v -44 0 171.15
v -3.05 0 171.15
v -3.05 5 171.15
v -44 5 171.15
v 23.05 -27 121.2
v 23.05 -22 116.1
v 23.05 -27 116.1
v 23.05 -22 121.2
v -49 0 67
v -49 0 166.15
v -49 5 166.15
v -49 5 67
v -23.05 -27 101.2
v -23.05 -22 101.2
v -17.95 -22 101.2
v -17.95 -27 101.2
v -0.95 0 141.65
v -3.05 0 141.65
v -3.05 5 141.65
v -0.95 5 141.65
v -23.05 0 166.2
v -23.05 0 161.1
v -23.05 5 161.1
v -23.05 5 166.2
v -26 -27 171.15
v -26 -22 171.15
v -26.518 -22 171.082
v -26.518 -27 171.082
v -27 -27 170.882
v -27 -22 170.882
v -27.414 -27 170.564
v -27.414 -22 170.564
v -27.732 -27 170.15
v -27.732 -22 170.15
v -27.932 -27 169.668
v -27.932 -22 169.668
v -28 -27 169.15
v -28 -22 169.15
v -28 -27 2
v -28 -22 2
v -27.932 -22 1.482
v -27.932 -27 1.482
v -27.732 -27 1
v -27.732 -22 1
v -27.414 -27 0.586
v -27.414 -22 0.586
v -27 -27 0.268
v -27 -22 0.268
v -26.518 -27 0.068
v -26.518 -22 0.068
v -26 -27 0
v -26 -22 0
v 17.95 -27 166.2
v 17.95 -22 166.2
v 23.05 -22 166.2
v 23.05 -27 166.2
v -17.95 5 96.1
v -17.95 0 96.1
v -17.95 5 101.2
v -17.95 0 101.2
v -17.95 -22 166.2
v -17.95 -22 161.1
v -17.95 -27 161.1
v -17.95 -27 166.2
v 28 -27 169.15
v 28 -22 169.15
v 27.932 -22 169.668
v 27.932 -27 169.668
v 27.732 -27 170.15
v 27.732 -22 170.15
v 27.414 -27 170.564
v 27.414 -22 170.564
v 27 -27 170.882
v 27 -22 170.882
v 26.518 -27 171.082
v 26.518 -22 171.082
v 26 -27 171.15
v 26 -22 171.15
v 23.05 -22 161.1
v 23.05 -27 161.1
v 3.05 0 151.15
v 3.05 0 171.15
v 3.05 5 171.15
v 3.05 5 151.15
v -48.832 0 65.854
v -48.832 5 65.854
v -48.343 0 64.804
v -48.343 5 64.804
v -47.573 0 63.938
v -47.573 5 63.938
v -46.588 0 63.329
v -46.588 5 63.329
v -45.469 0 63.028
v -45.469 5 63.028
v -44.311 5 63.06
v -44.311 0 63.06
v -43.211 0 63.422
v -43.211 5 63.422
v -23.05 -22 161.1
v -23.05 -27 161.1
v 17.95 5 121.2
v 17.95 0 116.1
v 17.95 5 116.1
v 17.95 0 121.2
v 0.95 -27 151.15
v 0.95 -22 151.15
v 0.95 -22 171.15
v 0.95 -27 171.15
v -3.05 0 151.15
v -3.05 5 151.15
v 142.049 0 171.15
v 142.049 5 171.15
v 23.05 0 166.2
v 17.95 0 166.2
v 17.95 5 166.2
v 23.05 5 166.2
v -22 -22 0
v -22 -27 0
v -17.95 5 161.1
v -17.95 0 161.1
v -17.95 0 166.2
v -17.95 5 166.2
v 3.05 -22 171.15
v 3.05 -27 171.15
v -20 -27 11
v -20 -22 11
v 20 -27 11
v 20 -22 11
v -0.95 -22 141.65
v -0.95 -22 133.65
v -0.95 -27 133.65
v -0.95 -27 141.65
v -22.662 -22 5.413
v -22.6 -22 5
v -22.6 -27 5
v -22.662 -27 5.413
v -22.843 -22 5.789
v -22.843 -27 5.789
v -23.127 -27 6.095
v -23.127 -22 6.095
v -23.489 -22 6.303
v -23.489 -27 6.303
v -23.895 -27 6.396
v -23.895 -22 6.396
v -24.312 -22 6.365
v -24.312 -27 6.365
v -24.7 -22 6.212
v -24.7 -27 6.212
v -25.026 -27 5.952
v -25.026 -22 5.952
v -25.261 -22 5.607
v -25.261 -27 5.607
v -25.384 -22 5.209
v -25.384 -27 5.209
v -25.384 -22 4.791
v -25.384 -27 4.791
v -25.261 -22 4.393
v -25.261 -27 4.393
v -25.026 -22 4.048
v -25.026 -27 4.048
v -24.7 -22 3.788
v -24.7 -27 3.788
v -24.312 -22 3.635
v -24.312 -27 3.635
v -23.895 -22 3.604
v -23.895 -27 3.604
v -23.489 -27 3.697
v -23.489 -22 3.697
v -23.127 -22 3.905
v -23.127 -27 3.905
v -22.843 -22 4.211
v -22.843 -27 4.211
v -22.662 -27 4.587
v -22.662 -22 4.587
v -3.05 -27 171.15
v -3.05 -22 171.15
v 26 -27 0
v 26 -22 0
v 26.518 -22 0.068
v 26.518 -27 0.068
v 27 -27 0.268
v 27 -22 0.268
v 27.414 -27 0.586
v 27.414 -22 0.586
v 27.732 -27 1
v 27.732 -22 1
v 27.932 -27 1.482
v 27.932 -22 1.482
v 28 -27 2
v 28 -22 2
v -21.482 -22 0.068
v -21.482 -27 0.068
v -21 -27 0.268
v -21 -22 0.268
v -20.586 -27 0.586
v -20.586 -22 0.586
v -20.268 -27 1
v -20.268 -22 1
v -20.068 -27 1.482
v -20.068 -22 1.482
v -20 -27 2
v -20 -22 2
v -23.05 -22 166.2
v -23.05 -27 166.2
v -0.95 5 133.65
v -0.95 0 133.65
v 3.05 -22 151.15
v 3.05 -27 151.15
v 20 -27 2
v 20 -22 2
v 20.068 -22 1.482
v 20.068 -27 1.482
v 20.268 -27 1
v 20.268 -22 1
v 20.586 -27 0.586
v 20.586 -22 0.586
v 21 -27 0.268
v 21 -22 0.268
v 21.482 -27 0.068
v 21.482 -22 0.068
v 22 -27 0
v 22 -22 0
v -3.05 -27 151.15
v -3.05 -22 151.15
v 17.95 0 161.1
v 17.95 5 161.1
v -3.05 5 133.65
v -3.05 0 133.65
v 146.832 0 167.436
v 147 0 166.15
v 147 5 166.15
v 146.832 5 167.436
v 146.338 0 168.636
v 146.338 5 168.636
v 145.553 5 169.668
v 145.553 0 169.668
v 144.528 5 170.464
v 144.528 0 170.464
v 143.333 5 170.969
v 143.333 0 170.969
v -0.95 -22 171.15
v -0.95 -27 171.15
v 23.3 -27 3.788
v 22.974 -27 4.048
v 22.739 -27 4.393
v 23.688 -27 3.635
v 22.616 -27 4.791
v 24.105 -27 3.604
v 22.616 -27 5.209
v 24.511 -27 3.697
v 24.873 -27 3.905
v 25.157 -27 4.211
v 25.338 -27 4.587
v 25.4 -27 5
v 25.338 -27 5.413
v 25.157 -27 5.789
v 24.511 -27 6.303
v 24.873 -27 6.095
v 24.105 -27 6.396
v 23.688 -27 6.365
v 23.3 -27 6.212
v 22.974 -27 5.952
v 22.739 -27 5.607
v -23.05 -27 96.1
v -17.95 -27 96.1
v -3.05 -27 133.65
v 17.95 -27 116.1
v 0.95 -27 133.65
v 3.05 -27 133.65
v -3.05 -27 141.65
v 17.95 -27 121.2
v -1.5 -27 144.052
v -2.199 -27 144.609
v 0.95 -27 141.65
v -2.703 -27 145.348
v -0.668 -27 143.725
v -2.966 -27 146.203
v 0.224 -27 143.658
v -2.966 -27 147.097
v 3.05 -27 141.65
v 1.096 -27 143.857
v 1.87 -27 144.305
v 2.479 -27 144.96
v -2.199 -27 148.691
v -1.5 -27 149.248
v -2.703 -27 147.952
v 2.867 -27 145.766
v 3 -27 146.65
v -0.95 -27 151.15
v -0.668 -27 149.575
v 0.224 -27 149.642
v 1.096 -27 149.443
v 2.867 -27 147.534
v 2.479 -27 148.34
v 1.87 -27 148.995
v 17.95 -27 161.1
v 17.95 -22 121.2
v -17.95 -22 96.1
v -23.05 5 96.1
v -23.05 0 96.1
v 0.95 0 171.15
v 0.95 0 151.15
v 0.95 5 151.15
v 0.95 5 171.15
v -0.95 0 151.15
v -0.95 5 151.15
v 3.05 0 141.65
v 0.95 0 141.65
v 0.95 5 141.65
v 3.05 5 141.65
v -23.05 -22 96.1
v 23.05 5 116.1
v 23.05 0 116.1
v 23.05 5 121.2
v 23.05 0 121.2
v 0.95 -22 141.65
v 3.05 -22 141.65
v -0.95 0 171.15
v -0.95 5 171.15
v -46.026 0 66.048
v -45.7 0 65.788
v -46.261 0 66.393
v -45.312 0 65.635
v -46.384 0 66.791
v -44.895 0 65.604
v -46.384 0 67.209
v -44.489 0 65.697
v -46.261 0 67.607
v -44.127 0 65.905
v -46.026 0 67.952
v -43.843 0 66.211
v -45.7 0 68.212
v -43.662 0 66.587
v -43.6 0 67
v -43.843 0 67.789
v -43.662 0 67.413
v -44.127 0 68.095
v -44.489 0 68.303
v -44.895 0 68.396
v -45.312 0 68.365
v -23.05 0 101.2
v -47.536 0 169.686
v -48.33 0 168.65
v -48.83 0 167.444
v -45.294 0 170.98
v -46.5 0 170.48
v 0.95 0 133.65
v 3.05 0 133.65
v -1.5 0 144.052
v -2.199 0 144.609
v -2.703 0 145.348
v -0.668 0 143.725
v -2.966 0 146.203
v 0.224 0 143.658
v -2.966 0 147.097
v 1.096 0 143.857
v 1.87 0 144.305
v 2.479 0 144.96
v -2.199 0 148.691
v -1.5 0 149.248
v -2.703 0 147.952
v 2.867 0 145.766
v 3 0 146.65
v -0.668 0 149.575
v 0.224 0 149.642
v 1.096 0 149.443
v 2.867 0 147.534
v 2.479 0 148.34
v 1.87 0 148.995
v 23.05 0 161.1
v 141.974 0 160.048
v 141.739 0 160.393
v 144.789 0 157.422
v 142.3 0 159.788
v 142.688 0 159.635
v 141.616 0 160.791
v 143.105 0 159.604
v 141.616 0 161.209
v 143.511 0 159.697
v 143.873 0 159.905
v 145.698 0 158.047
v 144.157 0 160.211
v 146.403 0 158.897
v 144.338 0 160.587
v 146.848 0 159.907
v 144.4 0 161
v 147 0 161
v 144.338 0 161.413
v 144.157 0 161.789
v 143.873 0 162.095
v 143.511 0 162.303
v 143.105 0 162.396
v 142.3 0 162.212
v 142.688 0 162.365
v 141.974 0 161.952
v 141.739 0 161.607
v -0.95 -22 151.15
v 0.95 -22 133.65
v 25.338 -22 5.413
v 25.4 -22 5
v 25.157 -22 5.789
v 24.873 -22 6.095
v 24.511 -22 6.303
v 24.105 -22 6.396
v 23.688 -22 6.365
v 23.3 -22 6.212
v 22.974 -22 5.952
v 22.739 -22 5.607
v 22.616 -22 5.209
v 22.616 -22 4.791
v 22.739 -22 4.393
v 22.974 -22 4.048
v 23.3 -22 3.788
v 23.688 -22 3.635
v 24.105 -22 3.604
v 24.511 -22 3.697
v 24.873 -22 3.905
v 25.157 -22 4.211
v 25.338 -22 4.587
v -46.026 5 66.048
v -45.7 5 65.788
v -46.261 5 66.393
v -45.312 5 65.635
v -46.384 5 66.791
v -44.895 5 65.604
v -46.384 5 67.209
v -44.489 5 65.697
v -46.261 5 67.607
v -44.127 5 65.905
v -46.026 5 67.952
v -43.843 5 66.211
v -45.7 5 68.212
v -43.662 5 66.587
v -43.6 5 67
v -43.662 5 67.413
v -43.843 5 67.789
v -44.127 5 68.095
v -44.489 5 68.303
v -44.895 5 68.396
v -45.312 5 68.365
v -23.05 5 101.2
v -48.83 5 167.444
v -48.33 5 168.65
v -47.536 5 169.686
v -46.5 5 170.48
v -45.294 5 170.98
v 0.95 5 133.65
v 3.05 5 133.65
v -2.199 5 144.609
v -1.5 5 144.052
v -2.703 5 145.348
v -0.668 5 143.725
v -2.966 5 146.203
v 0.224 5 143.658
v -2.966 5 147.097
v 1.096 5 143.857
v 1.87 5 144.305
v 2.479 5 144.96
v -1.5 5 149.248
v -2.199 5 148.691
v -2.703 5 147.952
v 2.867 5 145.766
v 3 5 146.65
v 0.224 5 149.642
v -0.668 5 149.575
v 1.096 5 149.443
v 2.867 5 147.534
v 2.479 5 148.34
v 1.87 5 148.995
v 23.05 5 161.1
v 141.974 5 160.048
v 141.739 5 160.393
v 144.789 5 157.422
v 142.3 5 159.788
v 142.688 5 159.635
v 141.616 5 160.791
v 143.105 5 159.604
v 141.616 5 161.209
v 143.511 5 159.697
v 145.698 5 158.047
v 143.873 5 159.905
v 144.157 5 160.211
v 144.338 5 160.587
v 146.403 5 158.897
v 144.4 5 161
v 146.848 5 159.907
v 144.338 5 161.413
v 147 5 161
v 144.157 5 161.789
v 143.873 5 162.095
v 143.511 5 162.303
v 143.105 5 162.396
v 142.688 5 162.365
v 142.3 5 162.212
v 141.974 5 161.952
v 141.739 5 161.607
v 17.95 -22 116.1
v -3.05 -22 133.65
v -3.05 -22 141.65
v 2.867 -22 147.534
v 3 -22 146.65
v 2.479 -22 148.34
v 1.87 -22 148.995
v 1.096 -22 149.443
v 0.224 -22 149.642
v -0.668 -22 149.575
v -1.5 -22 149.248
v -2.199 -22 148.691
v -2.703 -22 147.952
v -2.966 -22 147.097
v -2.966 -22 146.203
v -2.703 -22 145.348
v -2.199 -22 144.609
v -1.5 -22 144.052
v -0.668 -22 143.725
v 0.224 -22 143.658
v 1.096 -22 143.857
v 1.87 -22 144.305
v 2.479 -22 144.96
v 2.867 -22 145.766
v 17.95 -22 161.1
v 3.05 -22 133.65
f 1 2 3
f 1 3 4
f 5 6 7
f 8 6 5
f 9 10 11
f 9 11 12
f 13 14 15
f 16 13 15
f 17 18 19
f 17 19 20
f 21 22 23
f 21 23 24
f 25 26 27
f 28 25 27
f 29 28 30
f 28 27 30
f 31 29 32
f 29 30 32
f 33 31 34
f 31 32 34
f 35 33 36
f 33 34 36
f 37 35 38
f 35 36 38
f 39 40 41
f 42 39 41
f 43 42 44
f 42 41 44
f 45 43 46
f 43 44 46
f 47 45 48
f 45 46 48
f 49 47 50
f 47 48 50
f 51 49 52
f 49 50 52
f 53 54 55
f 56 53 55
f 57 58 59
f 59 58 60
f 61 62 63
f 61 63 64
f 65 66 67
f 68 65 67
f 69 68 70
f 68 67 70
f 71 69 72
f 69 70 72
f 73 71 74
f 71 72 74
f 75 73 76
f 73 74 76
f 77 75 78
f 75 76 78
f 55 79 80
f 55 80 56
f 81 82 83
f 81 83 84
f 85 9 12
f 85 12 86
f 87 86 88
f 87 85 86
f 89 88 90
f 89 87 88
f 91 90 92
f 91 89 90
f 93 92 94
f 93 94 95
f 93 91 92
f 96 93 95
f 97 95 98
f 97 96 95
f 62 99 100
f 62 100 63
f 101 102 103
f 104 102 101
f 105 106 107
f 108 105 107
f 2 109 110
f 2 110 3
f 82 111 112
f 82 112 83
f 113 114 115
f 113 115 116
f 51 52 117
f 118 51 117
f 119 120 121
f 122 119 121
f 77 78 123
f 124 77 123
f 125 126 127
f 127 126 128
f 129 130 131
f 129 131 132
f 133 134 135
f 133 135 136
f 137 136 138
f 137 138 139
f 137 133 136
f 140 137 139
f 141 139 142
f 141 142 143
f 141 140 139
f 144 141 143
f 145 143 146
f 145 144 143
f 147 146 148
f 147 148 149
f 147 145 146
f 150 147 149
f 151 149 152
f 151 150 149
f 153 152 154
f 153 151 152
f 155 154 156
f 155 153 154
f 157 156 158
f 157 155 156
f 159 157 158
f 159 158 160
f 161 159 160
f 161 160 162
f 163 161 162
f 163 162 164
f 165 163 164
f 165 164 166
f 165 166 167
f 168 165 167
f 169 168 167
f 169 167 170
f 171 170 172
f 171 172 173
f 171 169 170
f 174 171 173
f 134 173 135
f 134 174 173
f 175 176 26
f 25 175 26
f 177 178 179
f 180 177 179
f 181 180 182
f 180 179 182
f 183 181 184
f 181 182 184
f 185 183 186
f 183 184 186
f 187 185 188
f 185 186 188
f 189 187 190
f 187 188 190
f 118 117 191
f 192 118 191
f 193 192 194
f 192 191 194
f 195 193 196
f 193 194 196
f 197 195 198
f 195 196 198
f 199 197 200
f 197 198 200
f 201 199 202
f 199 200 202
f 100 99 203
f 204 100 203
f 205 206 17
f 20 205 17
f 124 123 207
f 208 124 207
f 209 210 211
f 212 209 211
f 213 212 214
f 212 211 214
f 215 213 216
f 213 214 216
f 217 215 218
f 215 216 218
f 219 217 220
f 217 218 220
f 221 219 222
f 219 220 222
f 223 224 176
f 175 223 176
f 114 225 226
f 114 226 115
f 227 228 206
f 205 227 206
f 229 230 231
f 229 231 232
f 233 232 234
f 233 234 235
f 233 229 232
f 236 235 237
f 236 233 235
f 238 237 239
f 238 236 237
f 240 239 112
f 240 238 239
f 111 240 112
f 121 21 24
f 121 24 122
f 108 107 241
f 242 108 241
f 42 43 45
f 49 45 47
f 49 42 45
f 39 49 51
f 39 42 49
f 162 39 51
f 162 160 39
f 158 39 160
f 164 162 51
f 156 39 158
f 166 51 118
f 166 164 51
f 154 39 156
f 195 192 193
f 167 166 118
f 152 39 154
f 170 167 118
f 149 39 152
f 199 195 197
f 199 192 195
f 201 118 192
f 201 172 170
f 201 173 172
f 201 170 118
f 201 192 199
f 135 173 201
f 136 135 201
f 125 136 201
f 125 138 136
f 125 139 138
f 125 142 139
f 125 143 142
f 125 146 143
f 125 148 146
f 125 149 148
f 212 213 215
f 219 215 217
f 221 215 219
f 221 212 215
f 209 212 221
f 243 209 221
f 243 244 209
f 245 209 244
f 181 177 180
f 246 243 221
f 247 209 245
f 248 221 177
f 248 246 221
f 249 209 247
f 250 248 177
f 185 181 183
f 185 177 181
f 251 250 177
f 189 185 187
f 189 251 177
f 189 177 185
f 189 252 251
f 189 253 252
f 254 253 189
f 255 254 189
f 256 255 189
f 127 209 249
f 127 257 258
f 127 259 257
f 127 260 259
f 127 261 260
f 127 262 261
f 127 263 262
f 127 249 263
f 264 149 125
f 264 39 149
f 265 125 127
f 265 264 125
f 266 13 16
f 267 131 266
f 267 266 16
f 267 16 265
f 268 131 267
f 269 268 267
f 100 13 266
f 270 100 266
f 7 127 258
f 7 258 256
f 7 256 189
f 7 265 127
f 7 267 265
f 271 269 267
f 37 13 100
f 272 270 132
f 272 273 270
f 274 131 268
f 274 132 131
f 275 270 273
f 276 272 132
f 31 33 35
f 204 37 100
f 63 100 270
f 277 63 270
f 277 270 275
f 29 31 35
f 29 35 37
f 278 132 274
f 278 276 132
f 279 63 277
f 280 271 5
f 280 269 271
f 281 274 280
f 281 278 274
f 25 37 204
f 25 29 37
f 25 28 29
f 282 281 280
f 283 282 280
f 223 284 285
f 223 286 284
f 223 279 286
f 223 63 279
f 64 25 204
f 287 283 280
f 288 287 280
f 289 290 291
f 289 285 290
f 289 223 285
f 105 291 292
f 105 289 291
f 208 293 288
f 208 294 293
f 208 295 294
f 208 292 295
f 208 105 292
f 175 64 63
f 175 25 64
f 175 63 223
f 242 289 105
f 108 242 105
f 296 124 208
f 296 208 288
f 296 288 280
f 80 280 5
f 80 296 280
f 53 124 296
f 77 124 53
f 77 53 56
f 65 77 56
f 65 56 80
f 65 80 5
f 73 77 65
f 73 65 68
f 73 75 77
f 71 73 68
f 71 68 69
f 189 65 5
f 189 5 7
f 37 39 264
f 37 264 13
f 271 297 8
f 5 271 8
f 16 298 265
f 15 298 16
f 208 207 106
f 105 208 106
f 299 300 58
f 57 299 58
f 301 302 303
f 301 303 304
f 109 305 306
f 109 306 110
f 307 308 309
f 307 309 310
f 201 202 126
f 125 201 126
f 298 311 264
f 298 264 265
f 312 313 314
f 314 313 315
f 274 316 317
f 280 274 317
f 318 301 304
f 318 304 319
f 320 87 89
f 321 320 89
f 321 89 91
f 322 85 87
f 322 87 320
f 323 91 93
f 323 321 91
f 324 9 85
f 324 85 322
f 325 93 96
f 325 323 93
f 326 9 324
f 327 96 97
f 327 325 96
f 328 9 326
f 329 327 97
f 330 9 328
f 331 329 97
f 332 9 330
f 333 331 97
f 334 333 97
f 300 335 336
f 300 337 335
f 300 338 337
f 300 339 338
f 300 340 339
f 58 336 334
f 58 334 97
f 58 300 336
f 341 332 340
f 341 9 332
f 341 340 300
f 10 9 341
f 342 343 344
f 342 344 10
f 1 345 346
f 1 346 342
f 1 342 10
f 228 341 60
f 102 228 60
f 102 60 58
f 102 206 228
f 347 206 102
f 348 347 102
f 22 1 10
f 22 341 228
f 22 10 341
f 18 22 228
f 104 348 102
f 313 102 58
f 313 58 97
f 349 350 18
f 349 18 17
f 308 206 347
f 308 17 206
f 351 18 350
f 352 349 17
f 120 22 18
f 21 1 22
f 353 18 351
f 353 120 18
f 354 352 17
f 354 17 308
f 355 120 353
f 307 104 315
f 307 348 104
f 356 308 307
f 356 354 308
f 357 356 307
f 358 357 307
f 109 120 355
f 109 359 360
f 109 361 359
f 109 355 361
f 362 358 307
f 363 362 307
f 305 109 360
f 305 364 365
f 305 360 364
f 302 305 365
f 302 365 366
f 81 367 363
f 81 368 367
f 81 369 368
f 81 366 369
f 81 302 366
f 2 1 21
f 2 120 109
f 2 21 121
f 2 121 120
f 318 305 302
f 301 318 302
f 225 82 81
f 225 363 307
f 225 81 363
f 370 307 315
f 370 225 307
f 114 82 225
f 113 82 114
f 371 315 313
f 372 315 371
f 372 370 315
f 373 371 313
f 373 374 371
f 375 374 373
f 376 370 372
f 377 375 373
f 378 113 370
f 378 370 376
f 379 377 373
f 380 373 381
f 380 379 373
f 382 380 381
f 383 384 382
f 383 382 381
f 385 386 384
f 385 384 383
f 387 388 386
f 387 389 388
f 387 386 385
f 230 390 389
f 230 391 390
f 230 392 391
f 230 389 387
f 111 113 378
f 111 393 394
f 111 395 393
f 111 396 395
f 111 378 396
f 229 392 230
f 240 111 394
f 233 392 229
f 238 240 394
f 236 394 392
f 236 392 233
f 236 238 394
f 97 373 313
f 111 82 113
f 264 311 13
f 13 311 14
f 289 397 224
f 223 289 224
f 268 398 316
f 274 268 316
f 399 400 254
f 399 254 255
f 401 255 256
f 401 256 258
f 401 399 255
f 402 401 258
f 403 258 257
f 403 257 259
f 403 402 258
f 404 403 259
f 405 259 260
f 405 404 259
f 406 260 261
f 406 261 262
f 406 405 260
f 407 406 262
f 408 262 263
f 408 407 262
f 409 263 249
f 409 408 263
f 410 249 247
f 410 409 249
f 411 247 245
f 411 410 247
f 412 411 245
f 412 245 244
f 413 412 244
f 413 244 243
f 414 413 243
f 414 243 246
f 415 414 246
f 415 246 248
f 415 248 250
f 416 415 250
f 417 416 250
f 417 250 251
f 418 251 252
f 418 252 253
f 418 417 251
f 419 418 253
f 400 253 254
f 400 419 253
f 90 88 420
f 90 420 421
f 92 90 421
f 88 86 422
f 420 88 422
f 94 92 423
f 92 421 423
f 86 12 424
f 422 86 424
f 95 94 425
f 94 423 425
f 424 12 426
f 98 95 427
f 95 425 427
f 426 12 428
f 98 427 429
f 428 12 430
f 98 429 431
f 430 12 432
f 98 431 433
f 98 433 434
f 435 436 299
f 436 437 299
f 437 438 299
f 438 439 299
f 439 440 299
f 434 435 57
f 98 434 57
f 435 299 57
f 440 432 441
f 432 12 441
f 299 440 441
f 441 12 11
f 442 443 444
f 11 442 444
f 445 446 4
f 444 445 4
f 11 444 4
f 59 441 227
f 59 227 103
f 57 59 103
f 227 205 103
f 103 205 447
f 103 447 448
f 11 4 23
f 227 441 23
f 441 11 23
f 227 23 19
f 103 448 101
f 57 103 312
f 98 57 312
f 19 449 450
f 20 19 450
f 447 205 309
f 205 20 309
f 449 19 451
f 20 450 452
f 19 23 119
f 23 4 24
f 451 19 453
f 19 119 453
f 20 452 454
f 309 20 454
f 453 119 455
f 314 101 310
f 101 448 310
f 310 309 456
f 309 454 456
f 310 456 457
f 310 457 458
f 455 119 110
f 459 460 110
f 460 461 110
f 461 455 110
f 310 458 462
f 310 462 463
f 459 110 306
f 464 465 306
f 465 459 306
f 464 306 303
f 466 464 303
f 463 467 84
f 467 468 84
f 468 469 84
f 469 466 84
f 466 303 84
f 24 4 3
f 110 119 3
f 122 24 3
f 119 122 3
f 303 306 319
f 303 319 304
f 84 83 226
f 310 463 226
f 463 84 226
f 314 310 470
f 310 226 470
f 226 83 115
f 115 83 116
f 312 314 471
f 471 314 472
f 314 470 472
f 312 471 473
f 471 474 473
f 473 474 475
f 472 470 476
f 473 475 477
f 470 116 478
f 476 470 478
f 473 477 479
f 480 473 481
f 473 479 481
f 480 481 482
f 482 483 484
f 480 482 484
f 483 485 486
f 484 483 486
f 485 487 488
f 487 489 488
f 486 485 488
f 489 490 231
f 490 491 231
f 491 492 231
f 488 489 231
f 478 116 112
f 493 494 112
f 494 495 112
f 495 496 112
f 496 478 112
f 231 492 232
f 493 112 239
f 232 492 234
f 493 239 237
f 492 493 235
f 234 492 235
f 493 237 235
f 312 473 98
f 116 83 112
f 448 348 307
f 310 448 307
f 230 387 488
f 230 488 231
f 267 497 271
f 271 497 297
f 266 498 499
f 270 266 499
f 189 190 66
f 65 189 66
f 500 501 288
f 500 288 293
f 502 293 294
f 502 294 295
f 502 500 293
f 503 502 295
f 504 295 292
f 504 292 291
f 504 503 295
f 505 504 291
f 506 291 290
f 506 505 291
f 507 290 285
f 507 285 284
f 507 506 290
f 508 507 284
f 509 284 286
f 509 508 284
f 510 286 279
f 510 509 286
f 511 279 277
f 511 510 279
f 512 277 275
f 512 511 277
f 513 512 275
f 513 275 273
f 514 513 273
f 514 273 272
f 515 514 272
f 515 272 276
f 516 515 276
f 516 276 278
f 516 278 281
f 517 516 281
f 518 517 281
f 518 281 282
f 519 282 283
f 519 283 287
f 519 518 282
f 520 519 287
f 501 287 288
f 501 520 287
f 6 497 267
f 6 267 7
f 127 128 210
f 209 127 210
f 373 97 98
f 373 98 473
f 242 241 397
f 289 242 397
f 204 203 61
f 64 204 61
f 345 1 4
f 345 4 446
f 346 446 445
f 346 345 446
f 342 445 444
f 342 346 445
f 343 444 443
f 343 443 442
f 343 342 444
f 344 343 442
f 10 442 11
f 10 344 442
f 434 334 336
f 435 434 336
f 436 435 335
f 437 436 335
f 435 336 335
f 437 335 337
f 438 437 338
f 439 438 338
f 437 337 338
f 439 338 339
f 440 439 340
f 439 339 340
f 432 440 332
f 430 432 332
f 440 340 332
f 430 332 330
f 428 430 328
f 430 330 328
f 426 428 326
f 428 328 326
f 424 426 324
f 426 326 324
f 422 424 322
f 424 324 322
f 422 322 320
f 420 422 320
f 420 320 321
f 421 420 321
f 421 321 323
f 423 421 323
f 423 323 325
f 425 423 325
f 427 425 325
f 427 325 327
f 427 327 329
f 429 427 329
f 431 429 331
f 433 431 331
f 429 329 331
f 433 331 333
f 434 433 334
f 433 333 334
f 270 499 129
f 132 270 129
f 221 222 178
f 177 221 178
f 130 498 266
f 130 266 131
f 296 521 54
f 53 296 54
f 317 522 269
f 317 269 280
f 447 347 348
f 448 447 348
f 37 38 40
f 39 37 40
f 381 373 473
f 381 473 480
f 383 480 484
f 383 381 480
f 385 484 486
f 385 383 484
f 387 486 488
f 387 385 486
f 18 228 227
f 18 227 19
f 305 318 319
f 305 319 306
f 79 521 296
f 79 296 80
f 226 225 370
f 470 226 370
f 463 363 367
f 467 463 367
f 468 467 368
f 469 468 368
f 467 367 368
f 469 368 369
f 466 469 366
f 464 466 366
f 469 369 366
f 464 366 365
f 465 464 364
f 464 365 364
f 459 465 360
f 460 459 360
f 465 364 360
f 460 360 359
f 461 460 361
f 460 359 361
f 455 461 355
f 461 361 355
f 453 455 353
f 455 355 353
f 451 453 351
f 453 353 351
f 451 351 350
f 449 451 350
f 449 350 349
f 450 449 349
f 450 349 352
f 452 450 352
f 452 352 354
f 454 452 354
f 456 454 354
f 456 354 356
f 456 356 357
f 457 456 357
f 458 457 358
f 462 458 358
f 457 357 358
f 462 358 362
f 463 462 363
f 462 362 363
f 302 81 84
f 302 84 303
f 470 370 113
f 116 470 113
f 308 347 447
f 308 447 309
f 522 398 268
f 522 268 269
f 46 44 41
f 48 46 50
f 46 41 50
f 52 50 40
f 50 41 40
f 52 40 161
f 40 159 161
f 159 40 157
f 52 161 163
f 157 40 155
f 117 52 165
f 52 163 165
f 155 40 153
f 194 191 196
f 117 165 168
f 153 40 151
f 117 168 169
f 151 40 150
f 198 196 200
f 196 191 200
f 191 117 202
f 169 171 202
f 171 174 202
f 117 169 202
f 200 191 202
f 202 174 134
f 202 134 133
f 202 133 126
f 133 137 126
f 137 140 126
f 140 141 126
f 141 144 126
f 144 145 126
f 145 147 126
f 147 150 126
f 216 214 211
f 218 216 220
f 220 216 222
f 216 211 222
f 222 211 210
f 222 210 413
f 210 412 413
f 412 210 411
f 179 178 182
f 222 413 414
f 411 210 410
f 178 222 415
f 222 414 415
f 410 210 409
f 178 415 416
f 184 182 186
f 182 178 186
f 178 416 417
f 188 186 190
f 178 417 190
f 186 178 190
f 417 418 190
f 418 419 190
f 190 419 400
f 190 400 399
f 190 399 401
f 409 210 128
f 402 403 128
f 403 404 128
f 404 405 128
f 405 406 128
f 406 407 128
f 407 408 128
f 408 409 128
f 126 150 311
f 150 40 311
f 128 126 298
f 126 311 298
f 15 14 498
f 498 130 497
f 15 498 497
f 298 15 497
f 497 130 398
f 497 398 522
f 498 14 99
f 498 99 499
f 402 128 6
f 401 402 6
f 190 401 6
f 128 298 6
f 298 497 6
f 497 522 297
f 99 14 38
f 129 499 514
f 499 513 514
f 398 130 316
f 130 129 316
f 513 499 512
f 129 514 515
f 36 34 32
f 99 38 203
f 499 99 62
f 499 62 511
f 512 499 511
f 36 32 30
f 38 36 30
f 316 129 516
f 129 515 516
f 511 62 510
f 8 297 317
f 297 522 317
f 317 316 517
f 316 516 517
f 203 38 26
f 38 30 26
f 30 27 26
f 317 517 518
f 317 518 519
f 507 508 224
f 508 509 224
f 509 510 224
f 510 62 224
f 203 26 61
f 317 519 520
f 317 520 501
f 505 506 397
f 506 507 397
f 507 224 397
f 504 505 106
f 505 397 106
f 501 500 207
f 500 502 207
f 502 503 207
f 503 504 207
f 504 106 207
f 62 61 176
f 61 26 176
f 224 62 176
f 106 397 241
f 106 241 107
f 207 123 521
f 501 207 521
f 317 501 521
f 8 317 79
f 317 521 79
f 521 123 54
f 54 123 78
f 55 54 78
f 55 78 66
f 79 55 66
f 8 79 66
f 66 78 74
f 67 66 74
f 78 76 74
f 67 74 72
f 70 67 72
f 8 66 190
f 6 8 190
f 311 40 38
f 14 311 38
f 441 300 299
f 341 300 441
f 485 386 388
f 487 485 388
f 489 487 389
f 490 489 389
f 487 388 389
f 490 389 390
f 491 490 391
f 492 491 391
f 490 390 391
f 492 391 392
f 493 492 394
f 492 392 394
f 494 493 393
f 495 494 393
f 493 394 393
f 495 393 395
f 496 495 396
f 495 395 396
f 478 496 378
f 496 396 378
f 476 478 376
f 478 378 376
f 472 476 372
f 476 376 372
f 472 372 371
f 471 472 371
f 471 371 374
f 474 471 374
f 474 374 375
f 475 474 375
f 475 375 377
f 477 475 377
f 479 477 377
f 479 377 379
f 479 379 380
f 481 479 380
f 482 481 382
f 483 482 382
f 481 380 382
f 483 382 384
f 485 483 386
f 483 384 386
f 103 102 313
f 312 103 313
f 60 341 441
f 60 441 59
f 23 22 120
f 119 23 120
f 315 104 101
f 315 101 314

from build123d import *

# Parameters (mm, degrees)
F0_R     = 1.4
F0_W     = 5.1
F0_H     = 5.1
F0_W_2   = 2.1
F0_H_2   = 8
F0_R_2   = 3
F3_DEPTH = 5
F2_R     = 1.4
F2_W     = 5.1
F2_H     = 5.1
F2_W_2   = 2.1
F2_H_2   = 8
F2_R_2   = 3
F4_DEPTH = 5


with BuildPart() as f3:
    # F0 (on Front) → F3 (new body)
    with BuildSketch(Plane.XZ):
        with BuildLine():
            Line((-43.211146, 63.422291), (144.788854, 157.422291))
            ThreePointArc((144.788854, 157.422291), (146.402603, 158.897076), (147, 161))
            Line((147, 161), (147, 166.150238))
            ThreePointArc((147, 166.150238), (145.55273, 169.668492), (142.048755, 171.15))
            Line((142.048755, 171.15), (3.05, 171.15))
            Line((3.05, 171.15), (3.05, 151.15))
            Line((3.05, 151.15), (0.95, 151.15))
            Line((0.95, 151.15), (0.95, 171.15))
            Line((0.95, 171.15), (-0.95, 171.15))
            Line((-0.95, 171.15), (-0.95, 151.15))
            Line((-0.95, 151.15), (-3.05, 151.15))
            Line((-3.05, 151.15), (-3.05, 171.15))
            Line((-3.05, 171.15), (-44, 171.15))
            ThreePointArc((-44, 171.15), (-47.535534, 169.685534), (-49, 166.15))
            Line((-49, 166.15), (-49, 67))
            ThreePointArc((-49, 67), (-47.102924, 63.597397), (-43.211146, 63.422291))
        make_face()
        with Locations((-45, 67)):
            Circle(F0_R, mode=Mode.SUBTRACT)
        with Locations((-20.5, 98.65)):
            Rectangle(F0_W, F0_H, mode=Mode.SUBTRACT)
        with Locations((-2, 137.65)):
            Rectangle(F0_W_2, F0_H_2, mode=Mode.SUBTRACT)
        with Locations((20.5, 118.65)):
            Rectangle(F0_W, F0_H, mode=Mode.SUBTRACT)
        with Locations((2, 137.65)):
            Rectangle(F0_W_2, F0_H_2, mode=Mode.SUBTRACT)
        with Locations((0, 146.65)):
            Circle(F0_R_2, mode=Mode.SUBTRACT)
        with Locations((-20.5, 163.65)):
            Rectangle(F0_W, F0_H, mode=Mode.SUBTRACT)
        with Locations((20.5, 163.65)):
            Rectangle(F0_W, F0_H, mode=Mode.SUBTRACT)
        with Locations((143, 161)):
            Circle(F0_R, mode=Mode.SUBTRACT)
    extrude(amount=-F3_DEPTH)


with BuildPart() as f4:
    # F2 (on offset) → F4 (new body)
    with BuildSketch(Plane.XZ.offset(22)):
        with BuildLine():
            ThreePointArc((-28, 2), (-27.414214, 0.585786), (-26, 0))
            Line((-26, 0), (-22, 0))
            ThreePointArc((-22, 0), (-20.585786, 0.585786), (-20, 2))
            Line((-20, 2), (-20, 11))
            Line((-20, 11), (20, 11))
            Line((20, 11), (20, 2))
            ThreePointArc((20, 2), (20.585786, 0.585786), (22, 0))
            Line((22, 0), (26, 0))
            ThreePointArc((26, 0), (27.414214, 0.585786), (28, 2))
            Line((28, 2), (28, 169.15))
            ThreePointArc((28, 169.15), (27.414214, 170.564214), (26, 171.15))
            Line((26, 171.15), (3.05, 171.15))
            Line((3.05, 171.15), (3.05, 151.15))
            Line((3.05, 151.15), (0.95, 151.15))
            Line((0.95, 151.15), (0.95, 171.15))
            Line((0.95, 171.15), (-0.95, 171.15))
            Line((-0.95, 171.15), (-0.95, 151.15))
            Line((-0.95, 151.15), (-3.05, 151.15))
            Line((-3.05, 151.15), (-3.05, 171.15))
            Line((-3.05, 171.15), (-26, 171.15))
            ThreePointArc((-26, 171.15), (-27.414214, 170.564214), (-28, 169.15))
            Line((-28, 169.15), (-28, 2))
        make_face()
        with Locations((-24, 5)):
            Circle(F2_R, mode=Mode.SUBTRACT)
        with Locations((24, 5)):
            Circle(F2_R, mode=Mode.SUBTRACT)
        with Locations((-20.5, 98.65)):
            Rectangle(F2_W, F2_H, mode=Mode.SUBTRACT)
        with Locations((-2, 137.65)):
            Rectangle(F2_W_2, F2_H_2, mode=Mode.SUBTRACT)
        with Locations((-20.5, 163.65)):
            Rectangle(F2_W, F2_H, mode=Mode.SUBTRACT)
        with Locations((20.5, 118.65)):
            Rectangle(F2_W, F2_H, mode=Mode.SUBTRACT)
        with Locations((2, 137.65)):
            Rectangle(F2_W_2, F2_H_2, mode=Mode.SUBTRACT)
        with Locations((0, 146.65)):
            Circle(F2_R_2, mode=Mode.SUBTRACT)
        with Locations((20.5, 163.65)):
            Rectangle(F2_W, F2_H, mode=Mode.SUBTRACT)
    extrude(amount=F4_DEPTH)


solid = Compound([f3.part, f4.part])
